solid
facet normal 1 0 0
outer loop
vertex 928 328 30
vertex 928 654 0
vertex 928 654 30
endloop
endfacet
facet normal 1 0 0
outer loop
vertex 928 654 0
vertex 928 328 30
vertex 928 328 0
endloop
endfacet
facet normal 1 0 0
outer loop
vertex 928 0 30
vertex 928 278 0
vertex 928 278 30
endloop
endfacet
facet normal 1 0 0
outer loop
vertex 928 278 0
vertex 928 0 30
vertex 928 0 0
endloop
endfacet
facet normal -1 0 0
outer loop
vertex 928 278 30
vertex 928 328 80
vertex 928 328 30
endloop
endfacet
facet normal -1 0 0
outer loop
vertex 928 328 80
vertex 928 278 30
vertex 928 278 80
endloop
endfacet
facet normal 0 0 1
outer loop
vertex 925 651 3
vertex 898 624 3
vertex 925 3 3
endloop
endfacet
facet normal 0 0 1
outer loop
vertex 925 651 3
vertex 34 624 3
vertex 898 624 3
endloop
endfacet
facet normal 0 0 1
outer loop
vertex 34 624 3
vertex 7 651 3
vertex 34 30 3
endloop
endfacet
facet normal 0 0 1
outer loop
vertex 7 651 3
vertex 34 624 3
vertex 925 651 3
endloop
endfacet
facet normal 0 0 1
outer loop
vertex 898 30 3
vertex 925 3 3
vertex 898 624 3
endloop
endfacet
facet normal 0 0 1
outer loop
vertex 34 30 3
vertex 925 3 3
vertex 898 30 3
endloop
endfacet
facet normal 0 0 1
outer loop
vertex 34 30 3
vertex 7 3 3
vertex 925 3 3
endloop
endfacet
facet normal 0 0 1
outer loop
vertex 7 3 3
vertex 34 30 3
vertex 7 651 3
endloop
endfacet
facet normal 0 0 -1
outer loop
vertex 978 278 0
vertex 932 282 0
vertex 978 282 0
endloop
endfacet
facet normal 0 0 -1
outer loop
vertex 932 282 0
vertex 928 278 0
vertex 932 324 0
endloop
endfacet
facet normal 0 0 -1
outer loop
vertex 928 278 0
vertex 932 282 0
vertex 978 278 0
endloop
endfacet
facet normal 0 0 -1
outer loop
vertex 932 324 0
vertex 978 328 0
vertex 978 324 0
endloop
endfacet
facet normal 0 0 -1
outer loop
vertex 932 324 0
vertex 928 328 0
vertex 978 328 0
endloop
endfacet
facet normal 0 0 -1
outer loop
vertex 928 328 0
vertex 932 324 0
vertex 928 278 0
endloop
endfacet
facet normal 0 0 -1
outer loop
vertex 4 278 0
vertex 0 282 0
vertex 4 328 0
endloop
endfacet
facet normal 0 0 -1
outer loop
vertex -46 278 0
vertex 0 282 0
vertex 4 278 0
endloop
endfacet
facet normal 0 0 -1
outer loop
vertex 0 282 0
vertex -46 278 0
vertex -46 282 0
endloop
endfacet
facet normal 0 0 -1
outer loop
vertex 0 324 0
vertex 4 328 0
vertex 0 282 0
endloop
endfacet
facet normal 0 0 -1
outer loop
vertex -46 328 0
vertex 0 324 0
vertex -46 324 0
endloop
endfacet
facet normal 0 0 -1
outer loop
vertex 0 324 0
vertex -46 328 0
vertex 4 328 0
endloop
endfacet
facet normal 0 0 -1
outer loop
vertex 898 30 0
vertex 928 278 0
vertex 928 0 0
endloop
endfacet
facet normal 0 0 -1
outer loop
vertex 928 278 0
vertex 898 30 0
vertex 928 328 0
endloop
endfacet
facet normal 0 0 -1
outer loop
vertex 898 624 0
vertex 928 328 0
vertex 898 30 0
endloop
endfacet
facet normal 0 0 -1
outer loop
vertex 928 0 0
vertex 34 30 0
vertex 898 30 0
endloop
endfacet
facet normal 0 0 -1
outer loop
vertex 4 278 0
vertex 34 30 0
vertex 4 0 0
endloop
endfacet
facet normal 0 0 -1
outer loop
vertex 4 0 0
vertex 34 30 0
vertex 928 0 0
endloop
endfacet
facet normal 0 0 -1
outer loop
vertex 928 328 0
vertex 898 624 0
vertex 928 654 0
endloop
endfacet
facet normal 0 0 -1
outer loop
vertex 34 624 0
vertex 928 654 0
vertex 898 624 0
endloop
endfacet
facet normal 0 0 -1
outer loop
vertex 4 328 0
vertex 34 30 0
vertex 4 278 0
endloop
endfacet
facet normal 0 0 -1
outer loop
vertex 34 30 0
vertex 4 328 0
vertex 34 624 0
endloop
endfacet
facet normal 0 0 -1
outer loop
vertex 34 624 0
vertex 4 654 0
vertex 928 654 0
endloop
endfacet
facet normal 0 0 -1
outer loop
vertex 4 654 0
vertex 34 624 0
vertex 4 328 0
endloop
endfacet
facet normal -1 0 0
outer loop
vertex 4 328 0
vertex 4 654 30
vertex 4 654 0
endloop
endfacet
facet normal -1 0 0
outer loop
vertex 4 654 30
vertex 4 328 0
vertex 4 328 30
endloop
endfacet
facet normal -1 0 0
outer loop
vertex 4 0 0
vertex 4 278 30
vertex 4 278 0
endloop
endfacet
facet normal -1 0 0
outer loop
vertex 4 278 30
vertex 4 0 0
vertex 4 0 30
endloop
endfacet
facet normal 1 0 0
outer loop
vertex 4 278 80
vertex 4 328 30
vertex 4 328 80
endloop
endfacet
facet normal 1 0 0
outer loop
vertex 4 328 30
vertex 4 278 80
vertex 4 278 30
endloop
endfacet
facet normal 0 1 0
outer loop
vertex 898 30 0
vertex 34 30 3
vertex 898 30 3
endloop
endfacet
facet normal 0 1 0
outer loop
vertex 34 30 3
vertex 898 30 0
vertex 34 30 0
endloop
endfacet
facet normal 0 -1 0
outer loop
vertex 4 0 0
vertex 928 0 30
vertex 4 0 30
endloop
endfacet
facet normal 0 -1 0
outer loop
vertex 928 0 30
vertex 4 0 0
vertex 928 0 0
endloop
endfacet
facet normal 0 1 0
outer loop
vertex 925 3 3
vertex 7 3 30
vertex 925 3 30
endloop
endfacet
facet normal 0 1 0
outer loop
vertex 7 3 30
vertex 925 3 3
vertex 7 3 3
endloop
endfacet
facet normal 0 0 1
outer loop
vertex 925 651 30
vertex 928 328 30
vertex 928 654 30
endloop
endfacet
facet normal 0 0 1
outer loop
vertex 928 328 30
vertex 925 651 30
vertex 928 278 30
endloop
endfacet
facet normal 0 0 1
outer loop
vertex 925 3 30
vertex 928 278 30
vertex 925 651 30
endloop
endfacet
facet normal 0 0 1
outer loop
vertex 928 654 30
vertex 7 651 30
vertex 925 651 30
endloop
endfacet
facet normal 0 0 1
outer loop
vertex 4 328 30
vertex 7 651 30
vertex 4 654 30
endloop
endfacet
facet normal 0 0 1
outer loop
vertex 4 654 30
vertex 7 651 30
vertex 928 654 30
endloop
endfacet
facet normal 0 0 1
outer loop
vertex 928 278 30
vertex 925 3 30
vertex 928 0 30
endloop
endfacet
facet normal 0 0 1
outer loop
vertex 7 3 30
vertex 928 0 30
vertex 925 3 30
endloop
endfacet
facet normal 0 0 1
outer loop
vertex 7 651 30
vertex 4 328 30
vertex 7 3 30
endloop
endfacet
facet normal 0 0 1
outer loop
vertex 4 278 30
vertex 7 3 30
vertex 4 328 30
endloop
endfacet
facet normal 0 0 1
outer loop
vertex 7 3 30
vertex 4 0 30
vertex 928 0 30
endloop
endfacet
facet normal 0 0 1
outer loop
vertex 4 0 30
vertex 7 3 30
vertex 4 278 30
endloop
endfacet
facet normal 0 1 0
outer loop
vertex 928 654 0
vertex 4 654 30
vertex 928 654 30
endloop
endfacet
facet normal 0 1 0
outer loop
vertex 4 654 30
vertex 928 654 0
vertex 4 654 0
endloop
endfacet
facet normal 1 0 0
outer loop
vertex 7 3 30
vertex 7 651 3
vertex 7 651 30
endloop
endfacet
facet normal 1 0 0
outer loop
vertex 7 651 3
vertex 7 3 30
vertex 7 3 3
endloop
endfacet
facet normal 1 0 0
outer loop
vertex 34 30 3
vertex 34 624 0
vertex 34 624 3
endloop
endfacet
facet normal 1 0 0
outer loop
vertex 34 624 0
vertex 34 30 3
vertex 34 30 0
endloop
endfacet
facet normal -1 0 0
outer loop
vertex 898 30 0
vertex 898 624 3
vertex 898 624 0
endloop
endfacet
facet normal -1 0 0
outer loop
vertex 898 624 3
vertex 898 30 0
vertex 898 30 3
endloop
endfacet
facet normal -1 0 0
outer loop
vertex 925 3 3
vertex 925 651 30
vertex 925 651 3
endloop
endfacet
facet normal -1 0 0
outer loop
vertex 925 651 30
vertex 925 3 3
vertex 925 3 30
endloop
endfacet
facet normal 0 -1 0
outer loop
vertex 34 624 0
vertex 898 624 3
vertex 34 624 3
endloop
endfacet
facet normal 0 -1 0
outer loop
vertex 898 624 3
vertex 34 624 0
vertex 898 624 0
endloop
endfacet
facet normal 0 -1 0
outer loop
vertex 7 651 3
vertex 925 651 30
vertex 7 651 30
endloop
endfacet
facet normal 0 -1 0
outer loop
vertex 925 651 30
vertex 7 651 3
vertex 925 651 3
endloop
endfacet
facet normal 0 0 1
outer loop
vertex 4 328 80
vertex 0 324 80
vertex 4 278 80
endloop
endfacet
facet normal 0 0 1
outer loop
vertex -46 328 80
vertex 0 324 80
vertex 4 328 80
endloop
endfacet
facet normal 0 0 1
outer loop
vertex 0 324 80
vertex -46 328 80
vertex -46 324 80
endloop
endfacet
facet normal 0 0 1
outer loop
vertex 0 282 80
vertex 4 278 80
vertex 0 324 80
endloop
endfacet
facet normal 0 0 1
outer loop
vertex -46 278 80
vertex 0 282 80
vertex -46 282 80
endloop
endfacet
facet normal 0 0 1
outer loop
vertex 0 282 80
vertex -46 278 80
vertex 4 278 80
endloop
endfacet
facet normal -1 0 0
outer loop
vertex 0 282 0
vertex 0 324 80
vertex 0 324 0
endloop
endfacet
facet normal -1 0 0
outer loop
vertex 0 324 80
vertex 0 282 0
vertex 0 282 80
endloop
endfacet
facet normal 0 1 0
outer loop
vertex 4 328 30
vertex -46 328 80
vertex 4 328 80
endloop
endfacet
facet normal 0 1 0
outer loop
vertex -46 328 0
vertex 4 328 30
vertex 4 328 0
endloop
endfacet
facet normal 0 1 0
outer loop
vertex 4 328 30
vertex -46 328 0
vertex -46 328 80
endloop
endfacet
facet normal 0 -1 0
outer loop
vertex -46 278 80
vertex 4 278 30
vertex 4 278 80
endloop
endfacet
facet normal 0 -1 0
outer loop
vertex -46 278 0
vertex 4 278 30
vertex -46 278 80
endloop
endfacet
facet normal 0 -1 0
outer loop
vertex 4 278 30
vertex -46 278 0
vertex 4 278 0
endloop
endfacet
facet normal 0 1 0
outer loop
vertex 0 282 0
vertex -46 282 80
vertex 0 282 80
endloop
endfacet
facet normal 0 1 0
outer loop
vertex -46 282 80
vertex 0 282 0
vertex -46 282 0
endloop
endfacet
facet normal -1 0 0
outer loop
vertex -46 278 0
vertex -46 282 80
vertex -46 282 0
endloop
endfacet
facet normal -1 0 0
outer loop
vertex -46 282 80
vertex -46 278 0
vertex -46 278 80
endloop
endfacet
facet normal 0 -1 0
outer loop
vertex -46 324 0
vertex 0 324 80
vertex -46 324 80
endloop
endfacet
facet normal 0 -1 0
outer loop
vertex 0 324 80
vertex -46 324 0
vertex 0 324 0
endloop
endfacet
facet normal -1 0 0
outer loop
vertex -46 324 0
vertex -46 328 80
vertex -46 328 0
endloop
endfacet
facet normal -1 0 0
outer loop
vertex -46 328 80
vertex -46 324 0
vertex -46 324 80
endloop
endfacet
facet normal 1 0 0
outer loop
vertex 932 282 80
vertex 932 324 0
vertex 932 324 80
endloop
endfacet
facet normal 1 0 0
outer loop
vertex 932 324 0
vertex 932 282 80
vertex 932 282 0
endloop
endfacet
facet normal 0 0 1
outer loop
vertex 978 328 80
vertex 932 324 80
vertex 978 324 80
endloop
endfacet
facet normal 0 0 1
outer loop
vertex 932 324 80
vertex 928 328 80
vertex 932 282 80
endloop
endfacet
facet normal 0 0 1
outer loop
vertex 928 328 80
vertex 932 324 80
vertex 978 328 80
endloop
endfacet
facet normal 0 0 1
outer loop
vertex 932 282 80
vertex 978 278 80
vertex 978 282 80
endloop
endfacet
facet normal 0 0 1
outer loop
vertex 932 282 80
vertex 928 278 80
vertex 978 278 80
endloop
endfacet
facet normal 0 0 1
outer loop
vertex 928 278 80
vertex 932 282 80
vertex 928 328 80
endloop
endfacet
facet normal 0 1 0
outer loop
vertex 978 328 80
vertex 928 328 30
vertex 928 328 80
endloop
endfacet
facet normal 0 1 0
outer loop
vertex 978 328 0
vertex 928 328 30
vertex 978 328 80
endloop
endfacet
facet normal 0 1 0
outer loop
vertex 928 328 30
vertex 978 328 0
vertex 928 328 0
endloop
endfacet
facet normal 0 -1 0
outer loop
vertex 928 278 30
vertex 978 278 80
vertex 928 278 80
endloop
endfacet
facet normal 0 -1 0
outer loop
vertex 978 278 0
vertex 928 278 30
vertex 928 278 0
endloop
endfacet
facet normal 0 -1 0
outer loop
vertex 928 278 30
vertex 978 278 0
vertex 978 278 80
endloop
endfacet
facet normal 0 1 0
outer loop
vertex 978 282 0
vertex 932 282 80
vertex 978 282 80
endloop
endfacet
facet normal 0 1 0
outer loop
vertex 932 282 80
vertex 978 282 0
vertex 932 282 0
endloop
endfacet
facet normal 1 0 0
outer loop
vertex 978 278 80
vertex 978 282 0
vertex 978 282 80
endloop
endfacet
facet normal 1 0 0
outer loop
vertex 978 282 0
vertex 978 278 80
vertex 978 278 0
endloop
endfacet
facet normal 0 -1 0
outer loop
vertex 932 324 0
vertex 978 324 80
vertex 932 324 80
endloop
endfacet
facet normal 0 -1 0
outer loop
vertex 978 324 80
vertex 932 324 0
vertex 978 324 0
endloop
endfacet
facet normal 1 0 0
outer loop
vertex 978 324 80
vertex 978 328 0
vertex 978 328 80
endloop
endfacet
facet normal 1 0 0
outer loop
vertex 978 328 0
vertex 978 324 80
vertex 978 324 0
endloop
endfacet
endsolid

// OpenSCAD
// file: grate.scad
include <../../library/profiles.scad>
include <./config.scad>

module grateTemplate(grateLength = 600, grateWidth = 400) {
    module partsList() {

    }

    partsList();

    // hinten
    cube([grateLength, profileSize + 5, profileSize+ 5]);
    
    // vorne
    translate([0, grateWidth - profileSize, 0])
    cube([grateLength, profileSize, profileSize]);
    

    // rippen
    amount = round(grateLength / 35);
    startPos = 18;
    echo(str("anzahl ", amount))
    for ( i = [0 : amount - 1] ) {
        translate([(i * 35) + startPos, 0, 45])
        rotate([45, 0.5, 90])
        lShapeProfile(grateWidth + 30, 20, 2);
    }
}

module grate() {
    grateLength = outerWidth - fireBasketWidth - (profileSize * 4) - (grateGap * 4) - ((4 * grateProfileThickness));
    grateWidth = outerDepth - profileSize - (6 * grateProfileThickness);

    grateTemplate(grateLength, grateWidth);
}

module halfGrate() {
    halfGrateLength = (outerWidth - fireBasketWidth - (profileSize * 4) - (grateGap * 4) - ((5 * grateProfileThickness))) / 2;
    grateWidth = outerDepth - profileSize - (6 * grateProfileThickness);

    grateTemplate(halfGrateLength, grateWidth);
}
// file: ../../library/profiles.scad
module lShapeProfile($length, $size, $thickness) {
    cube([$length, $size, $thickness]);
    rotate([90, 0, 0])
    translate([0, 0, -$thickness]) cube([$length, $size, $thickness]);
}


module uShapeProfile($length, $size, $thickness) {
    cube([$length, $size, $thickness]);
    rotate([90, 0, 0])
    translate([0, 0, -$thickness]) cube([$length, $size, $thickness]);

    translate([0, $size, 0])
    rotate([90, 0, 0])
    cube([$length, $size, $thickness]);
}


module squareTubeProfile($length, $size, $thickness) {
    cube([$length, $size, $thickness]);

    rotate([90, 0, 0])
    translate([0, 0, -$thickness])
    cube([$length, $size, $thickness]);

    translate([0, $size, 0])
    rotate([90, 0, 0])
    cube([$length, $size, $thickness]);

    translate([0, 0, $size - $thickness])
    cube([$length, $size, $thickness]);
}
// file: config.scad
drawReferences = false;
drawReferenceWall = true;

outerWidth = 1500;
outerDepth = 700;
outerHeight = 700;

profileSize = 40;

fireBasketHeight = 250;
fireBasketWidth = 400;
fireBasketGroundClearance = 100;
fireBasketFrontOpen = true;

spindleDiameter  = 20;
spindleOverlength = 5;
spindleWallExtension = 140;
spindleWheelDiameter = 200;
spindlePlateThickness = 5;
spindlePlateGap = 2;
spindleHandleThickness = 8;

grateGap = 4;
grateSize = 30;
grateProfileThickness = 3;

lineThickness = 1;
lineGap = 80;
textSize = 20;

$fn = 120;
// main file
include <./config.scad>

use <./grateFrame.scad>


color([255/255, 127/255, 127/255])
grateFrame();


// start csv header
grateFramePartsList();
